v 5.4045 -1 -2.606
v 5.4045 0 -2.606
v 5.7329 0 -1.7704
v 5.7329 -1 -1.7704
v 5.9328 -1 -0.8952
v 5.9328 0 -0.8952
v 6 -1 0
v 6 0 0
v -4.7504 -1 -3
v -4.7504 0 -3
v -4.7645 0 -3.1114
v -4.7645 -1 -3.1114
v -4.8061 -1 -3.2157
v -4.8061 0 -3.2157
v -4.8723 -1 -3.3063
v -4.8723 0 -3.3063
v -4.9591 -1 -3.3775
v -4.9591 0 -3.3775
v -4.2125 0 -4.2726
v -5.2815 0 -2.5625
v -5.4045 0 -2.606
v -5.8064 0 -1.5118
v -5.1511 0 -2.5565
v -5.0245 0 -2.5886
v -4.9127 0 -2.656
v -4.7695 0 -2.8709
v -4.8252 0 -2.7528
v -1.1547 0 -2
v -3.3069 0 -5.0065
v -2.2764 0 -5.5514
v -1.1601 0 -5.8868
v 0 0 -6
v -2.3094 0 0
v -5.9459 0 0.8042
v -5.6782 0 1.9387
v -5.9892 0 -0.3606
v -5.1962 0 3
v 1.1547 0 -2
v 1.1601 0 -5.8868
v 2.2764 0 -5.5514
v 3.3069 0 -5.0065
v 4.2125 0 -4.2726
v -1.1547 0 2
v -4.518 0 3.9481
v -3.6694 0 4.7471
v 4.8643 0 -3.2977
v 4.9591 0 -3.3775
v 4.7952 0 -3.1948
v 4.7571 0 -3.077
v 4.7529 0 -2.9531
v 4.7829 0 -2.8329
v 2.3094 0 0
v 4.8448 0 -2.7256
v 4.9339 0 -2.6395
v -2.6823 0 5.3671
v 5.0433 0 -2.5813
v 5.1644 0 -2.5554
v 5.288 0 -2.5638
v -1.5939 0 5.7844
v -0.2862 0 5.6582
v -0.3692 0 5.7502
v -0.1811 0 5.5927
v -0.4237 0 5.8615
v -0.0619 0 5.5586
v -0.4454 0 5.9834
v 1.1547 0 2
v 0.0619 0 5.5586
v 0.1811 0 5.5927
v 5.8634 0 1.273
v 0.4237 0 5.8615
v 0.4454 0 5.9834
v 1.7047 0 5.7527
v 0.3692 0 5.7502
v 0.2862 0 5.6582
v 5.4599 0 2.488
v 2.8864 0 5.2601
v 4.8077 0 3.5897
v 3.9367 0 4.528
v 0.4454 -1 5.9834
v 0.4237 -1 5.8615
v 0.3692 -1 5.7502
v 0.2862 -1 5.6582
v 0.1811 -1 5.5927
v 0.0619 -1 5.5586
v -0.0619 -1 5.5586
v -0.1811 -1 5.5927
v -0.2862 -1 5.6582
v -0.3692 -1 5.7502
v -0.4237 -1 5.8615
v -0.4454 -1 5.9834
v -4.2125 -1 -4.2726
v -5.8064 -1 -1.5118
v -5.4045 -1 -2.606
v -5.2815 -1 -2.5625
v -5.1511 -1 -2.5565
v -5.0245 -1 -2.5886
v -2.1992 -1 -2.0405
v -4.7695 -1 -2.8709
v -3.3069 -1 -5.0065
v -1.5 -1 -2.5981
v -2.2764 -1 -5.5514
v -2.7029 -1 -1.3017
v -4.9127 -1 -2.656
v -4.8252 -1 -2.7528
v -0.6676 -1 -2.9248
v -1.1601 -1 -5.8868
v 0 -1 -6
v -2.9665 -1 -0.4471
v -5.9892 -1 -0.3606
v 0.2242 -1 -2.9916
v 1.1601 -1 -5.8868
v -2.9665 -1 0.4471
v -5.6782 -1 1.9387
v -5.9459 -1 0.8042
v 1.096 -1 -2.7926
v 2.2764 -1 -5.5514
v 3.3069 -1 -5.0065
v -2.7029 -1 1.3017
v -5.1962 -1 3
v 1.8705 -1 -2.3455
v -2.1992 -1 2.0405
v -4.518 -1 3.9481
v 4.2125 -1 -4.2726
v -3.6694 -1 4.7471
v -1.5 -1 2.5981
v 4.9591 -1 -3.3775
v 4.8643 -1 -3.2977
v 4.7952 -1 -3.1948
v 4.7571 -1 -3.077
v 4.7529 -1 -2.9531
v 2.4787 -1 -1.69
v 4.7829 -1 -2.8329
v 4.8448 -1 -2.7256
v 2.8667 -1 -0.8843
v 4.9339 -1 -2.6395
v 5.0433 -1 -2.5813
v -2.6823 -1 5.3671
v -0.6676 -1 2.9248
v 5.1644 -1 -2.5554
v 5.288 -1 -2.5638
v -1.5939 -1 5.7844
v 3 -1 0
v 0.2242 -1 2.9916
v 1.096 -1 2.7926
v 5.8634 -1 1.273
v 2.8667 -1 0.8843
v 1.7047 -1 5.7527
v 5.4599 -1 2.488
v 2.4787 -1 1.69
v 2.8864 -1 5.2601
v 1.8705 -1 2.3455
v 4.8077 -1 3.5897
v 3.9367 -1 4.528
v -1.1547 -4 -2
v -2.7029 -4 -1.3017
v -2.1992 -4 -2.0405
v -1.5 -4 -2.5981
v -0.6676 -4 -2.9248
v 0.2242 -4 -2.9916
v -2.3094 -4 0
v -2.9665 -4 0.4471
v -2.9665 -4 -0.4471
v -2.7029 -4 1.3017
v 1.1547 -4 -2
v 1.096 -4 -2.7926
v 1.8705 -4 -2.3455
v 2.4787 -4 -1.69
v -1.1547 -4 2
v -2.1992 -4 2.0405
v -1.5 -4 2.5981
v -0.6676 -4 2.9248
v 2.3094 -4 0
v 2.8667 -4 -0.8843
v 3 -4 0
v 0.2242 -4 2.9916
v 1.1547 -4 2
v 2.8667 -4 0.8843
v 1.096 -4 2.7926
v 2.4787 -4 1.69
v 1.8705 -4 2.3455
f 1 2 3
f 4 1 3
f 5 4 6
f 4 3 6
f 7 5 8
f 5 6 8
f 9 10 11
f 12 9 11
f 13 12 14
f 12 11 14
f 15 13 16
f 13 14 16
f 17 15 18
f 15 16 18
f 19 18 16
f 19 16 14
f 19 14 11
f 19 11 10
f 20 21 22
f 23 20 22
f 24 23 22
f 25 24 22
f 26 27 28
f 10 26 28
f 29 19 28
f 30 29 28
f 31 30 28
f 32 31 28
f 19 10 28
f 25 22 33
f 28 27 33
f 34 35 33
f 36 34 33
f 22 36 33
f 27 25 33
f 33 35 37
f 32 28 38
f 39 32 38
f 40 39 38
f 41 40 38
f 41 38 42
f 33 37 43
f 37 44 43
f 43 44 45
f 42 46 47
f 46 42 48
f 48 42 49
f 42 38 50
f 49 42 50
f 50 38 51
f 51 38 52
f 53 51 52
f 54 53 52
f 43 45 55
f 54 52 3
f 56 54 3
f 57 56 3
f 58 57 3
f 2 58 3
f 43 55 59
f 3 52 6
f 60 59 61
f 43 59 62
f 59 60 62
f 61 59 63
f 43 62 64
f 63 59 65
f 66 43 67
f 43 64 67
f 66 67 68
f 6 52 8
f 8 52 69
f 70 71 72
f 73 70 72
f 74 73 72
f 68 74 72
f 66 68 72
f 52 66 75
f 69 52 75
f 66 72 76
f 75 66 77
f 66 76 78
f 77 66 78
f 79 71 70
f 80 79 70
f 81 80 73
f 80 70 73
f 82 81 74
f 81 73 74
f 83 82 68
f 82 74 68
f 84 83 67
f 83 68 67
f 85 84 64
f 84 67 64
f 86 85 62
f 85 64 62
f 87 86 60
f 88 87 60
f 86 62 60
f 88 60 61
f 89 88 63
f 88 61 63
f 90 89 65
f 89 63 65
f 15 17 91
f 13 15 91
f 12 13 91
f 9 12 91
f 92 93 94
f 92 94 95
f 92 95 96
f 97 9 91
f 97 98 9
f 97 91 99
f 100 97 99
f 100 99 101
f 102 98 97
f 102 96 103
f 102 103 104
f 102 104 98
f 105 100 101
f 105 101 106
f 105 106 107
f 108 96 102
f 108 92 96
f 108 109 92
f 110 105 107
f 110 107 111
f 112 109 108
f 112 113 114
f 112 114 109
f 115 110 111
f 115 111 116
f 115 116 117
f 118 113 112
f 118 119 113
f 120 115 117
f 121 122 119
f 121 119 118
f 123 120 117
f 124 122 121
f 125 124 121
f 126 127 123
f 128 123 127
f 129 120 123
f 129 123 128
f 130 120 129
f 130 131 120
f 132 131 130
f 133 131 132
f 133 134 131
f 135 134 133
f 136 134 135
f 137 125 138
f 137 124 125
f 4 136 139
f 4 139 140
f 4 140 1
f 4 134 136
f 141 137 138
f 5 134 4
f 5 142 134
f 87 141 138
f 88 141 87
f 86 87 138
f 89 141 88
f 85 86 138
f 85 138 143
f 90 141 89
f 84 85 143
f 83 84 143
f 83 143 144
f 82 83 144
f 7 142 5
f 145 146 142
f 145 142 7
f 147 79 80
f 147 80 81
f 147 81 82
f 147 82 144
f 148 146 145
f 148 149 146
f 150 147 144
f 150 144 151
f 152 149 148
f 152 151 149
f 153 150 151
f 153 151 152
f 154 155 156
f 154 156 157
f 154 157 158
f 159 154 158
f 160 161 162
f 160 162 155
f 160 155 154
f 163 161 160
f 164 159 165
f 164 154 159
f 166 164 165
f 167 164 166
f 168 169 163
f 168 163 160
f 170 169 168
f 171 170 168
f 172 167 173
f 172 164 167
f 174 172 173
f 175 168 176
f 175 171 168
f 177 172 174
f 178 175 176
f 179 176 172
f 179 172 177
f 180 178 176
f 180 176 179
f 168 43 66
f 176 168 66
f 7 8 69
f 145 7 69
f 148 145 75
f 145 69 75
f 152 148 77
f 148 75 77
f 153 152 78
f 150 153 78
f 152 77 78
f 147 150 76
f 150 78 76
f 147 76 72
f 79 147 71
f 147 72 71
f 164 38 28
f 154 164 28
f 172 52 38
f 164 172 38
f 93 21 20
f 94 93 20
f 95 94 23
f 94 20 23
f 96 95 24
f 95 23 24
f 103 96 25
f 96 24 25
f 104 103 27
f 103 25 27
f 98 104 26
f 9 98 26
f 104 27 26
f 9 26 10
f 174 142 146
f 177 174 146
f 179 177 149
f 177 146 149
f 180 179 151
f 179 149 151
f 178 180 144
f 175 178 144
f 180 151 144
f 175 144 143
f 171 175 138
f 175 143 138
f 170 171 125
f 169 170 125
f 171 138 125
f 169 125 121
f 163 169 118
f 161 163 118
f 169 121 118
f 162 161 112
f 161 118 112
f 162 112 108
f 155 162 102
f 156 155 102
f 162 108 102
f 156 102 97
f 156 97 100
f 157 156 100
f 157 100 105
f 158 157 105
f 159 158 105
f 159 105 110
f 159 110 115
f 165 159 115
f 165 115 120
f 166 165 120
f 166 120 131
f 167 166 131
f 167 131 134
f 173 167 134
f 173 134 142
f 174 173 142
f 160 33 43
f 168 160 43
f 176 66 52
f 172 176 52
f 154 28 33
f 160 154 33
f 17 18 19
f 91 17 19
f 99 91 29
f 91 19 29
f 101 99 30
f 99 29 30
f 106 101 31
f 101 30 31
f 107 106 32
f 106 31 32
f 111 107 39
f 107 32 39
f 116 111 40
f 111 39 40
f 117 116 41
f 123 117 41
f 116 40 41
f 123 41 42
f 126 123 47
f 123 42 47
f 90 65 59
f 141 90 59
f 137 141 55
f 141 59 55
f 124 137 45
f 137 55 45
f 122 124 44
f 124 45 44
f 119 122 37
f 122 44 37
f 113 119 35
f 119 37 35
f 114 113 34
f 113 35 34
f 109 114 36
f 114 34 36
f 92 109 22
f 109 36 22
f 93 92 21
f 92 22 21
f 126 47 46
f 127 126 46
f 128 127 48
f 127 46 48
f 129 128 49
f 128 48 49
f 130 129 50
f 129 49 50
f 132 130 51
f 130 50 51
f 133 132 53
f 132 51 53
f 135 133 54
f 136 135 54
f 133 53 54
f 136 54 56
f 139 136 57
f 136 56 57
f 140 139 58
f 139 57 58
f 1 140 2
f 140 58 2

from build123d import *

# Parameters (mm, degrees)
F0_R     = 3
F1_DEPTH = 1
F2_DEPTH = 4


with BuildPart() as f1:
    # F0 (on Front) → F1 (new body)
    with BuildSketch(Plane.XZ):
        with BuildLine():
            ThreePointArc((5.404533, -2.605959), (5.849239, -1.336563), (6, 0))
            ThreePointArc((6, 0), (4.397308, 4.082117), (0.44544, 5.983442))
            ThreePointArc((0.44544, 5.983442), (0, 5.554253), (-0.44544, 5.983442))
            ThreePointArc((-0.44544, 5.983442), (-5.196152, 3), (-5.404533, -2.605959))
            ThreePointArc((-5.404533, -2.605959), (-4.966146, -2.618178), (-4.750405, -3))
            ThreePointArc((-4.750405, -3), (-4.80605, -3.215664), (-4.959093, -3.377483))
            ThreePointArc((-4.959093, -3.377483), (0, -6), (4.959093, -3.377483))
            ThreePointArc((4.959093, -3.377483), (4.810124, -2.777126), (5.404533, -2.605959))
        make_face()
        Circle(F0_R, mode=Mode.SUBTRACT)
    extrude(amount=F1_DEPTH)

    # F0 (on Front) → F2 (join)
    with BuildSketch(Plane.XZ):
        Circle(F0_R)
        Polygon((-2.309401, 0), (-1.154701, 2), (1.154701, 2), (2.309401, 0), (1.154701, -2), (-1.154701, -2), align=None, mode=Mode.SUBTRACT)
    extrude(amount=F2_DEPTH)


solid = f1.part
